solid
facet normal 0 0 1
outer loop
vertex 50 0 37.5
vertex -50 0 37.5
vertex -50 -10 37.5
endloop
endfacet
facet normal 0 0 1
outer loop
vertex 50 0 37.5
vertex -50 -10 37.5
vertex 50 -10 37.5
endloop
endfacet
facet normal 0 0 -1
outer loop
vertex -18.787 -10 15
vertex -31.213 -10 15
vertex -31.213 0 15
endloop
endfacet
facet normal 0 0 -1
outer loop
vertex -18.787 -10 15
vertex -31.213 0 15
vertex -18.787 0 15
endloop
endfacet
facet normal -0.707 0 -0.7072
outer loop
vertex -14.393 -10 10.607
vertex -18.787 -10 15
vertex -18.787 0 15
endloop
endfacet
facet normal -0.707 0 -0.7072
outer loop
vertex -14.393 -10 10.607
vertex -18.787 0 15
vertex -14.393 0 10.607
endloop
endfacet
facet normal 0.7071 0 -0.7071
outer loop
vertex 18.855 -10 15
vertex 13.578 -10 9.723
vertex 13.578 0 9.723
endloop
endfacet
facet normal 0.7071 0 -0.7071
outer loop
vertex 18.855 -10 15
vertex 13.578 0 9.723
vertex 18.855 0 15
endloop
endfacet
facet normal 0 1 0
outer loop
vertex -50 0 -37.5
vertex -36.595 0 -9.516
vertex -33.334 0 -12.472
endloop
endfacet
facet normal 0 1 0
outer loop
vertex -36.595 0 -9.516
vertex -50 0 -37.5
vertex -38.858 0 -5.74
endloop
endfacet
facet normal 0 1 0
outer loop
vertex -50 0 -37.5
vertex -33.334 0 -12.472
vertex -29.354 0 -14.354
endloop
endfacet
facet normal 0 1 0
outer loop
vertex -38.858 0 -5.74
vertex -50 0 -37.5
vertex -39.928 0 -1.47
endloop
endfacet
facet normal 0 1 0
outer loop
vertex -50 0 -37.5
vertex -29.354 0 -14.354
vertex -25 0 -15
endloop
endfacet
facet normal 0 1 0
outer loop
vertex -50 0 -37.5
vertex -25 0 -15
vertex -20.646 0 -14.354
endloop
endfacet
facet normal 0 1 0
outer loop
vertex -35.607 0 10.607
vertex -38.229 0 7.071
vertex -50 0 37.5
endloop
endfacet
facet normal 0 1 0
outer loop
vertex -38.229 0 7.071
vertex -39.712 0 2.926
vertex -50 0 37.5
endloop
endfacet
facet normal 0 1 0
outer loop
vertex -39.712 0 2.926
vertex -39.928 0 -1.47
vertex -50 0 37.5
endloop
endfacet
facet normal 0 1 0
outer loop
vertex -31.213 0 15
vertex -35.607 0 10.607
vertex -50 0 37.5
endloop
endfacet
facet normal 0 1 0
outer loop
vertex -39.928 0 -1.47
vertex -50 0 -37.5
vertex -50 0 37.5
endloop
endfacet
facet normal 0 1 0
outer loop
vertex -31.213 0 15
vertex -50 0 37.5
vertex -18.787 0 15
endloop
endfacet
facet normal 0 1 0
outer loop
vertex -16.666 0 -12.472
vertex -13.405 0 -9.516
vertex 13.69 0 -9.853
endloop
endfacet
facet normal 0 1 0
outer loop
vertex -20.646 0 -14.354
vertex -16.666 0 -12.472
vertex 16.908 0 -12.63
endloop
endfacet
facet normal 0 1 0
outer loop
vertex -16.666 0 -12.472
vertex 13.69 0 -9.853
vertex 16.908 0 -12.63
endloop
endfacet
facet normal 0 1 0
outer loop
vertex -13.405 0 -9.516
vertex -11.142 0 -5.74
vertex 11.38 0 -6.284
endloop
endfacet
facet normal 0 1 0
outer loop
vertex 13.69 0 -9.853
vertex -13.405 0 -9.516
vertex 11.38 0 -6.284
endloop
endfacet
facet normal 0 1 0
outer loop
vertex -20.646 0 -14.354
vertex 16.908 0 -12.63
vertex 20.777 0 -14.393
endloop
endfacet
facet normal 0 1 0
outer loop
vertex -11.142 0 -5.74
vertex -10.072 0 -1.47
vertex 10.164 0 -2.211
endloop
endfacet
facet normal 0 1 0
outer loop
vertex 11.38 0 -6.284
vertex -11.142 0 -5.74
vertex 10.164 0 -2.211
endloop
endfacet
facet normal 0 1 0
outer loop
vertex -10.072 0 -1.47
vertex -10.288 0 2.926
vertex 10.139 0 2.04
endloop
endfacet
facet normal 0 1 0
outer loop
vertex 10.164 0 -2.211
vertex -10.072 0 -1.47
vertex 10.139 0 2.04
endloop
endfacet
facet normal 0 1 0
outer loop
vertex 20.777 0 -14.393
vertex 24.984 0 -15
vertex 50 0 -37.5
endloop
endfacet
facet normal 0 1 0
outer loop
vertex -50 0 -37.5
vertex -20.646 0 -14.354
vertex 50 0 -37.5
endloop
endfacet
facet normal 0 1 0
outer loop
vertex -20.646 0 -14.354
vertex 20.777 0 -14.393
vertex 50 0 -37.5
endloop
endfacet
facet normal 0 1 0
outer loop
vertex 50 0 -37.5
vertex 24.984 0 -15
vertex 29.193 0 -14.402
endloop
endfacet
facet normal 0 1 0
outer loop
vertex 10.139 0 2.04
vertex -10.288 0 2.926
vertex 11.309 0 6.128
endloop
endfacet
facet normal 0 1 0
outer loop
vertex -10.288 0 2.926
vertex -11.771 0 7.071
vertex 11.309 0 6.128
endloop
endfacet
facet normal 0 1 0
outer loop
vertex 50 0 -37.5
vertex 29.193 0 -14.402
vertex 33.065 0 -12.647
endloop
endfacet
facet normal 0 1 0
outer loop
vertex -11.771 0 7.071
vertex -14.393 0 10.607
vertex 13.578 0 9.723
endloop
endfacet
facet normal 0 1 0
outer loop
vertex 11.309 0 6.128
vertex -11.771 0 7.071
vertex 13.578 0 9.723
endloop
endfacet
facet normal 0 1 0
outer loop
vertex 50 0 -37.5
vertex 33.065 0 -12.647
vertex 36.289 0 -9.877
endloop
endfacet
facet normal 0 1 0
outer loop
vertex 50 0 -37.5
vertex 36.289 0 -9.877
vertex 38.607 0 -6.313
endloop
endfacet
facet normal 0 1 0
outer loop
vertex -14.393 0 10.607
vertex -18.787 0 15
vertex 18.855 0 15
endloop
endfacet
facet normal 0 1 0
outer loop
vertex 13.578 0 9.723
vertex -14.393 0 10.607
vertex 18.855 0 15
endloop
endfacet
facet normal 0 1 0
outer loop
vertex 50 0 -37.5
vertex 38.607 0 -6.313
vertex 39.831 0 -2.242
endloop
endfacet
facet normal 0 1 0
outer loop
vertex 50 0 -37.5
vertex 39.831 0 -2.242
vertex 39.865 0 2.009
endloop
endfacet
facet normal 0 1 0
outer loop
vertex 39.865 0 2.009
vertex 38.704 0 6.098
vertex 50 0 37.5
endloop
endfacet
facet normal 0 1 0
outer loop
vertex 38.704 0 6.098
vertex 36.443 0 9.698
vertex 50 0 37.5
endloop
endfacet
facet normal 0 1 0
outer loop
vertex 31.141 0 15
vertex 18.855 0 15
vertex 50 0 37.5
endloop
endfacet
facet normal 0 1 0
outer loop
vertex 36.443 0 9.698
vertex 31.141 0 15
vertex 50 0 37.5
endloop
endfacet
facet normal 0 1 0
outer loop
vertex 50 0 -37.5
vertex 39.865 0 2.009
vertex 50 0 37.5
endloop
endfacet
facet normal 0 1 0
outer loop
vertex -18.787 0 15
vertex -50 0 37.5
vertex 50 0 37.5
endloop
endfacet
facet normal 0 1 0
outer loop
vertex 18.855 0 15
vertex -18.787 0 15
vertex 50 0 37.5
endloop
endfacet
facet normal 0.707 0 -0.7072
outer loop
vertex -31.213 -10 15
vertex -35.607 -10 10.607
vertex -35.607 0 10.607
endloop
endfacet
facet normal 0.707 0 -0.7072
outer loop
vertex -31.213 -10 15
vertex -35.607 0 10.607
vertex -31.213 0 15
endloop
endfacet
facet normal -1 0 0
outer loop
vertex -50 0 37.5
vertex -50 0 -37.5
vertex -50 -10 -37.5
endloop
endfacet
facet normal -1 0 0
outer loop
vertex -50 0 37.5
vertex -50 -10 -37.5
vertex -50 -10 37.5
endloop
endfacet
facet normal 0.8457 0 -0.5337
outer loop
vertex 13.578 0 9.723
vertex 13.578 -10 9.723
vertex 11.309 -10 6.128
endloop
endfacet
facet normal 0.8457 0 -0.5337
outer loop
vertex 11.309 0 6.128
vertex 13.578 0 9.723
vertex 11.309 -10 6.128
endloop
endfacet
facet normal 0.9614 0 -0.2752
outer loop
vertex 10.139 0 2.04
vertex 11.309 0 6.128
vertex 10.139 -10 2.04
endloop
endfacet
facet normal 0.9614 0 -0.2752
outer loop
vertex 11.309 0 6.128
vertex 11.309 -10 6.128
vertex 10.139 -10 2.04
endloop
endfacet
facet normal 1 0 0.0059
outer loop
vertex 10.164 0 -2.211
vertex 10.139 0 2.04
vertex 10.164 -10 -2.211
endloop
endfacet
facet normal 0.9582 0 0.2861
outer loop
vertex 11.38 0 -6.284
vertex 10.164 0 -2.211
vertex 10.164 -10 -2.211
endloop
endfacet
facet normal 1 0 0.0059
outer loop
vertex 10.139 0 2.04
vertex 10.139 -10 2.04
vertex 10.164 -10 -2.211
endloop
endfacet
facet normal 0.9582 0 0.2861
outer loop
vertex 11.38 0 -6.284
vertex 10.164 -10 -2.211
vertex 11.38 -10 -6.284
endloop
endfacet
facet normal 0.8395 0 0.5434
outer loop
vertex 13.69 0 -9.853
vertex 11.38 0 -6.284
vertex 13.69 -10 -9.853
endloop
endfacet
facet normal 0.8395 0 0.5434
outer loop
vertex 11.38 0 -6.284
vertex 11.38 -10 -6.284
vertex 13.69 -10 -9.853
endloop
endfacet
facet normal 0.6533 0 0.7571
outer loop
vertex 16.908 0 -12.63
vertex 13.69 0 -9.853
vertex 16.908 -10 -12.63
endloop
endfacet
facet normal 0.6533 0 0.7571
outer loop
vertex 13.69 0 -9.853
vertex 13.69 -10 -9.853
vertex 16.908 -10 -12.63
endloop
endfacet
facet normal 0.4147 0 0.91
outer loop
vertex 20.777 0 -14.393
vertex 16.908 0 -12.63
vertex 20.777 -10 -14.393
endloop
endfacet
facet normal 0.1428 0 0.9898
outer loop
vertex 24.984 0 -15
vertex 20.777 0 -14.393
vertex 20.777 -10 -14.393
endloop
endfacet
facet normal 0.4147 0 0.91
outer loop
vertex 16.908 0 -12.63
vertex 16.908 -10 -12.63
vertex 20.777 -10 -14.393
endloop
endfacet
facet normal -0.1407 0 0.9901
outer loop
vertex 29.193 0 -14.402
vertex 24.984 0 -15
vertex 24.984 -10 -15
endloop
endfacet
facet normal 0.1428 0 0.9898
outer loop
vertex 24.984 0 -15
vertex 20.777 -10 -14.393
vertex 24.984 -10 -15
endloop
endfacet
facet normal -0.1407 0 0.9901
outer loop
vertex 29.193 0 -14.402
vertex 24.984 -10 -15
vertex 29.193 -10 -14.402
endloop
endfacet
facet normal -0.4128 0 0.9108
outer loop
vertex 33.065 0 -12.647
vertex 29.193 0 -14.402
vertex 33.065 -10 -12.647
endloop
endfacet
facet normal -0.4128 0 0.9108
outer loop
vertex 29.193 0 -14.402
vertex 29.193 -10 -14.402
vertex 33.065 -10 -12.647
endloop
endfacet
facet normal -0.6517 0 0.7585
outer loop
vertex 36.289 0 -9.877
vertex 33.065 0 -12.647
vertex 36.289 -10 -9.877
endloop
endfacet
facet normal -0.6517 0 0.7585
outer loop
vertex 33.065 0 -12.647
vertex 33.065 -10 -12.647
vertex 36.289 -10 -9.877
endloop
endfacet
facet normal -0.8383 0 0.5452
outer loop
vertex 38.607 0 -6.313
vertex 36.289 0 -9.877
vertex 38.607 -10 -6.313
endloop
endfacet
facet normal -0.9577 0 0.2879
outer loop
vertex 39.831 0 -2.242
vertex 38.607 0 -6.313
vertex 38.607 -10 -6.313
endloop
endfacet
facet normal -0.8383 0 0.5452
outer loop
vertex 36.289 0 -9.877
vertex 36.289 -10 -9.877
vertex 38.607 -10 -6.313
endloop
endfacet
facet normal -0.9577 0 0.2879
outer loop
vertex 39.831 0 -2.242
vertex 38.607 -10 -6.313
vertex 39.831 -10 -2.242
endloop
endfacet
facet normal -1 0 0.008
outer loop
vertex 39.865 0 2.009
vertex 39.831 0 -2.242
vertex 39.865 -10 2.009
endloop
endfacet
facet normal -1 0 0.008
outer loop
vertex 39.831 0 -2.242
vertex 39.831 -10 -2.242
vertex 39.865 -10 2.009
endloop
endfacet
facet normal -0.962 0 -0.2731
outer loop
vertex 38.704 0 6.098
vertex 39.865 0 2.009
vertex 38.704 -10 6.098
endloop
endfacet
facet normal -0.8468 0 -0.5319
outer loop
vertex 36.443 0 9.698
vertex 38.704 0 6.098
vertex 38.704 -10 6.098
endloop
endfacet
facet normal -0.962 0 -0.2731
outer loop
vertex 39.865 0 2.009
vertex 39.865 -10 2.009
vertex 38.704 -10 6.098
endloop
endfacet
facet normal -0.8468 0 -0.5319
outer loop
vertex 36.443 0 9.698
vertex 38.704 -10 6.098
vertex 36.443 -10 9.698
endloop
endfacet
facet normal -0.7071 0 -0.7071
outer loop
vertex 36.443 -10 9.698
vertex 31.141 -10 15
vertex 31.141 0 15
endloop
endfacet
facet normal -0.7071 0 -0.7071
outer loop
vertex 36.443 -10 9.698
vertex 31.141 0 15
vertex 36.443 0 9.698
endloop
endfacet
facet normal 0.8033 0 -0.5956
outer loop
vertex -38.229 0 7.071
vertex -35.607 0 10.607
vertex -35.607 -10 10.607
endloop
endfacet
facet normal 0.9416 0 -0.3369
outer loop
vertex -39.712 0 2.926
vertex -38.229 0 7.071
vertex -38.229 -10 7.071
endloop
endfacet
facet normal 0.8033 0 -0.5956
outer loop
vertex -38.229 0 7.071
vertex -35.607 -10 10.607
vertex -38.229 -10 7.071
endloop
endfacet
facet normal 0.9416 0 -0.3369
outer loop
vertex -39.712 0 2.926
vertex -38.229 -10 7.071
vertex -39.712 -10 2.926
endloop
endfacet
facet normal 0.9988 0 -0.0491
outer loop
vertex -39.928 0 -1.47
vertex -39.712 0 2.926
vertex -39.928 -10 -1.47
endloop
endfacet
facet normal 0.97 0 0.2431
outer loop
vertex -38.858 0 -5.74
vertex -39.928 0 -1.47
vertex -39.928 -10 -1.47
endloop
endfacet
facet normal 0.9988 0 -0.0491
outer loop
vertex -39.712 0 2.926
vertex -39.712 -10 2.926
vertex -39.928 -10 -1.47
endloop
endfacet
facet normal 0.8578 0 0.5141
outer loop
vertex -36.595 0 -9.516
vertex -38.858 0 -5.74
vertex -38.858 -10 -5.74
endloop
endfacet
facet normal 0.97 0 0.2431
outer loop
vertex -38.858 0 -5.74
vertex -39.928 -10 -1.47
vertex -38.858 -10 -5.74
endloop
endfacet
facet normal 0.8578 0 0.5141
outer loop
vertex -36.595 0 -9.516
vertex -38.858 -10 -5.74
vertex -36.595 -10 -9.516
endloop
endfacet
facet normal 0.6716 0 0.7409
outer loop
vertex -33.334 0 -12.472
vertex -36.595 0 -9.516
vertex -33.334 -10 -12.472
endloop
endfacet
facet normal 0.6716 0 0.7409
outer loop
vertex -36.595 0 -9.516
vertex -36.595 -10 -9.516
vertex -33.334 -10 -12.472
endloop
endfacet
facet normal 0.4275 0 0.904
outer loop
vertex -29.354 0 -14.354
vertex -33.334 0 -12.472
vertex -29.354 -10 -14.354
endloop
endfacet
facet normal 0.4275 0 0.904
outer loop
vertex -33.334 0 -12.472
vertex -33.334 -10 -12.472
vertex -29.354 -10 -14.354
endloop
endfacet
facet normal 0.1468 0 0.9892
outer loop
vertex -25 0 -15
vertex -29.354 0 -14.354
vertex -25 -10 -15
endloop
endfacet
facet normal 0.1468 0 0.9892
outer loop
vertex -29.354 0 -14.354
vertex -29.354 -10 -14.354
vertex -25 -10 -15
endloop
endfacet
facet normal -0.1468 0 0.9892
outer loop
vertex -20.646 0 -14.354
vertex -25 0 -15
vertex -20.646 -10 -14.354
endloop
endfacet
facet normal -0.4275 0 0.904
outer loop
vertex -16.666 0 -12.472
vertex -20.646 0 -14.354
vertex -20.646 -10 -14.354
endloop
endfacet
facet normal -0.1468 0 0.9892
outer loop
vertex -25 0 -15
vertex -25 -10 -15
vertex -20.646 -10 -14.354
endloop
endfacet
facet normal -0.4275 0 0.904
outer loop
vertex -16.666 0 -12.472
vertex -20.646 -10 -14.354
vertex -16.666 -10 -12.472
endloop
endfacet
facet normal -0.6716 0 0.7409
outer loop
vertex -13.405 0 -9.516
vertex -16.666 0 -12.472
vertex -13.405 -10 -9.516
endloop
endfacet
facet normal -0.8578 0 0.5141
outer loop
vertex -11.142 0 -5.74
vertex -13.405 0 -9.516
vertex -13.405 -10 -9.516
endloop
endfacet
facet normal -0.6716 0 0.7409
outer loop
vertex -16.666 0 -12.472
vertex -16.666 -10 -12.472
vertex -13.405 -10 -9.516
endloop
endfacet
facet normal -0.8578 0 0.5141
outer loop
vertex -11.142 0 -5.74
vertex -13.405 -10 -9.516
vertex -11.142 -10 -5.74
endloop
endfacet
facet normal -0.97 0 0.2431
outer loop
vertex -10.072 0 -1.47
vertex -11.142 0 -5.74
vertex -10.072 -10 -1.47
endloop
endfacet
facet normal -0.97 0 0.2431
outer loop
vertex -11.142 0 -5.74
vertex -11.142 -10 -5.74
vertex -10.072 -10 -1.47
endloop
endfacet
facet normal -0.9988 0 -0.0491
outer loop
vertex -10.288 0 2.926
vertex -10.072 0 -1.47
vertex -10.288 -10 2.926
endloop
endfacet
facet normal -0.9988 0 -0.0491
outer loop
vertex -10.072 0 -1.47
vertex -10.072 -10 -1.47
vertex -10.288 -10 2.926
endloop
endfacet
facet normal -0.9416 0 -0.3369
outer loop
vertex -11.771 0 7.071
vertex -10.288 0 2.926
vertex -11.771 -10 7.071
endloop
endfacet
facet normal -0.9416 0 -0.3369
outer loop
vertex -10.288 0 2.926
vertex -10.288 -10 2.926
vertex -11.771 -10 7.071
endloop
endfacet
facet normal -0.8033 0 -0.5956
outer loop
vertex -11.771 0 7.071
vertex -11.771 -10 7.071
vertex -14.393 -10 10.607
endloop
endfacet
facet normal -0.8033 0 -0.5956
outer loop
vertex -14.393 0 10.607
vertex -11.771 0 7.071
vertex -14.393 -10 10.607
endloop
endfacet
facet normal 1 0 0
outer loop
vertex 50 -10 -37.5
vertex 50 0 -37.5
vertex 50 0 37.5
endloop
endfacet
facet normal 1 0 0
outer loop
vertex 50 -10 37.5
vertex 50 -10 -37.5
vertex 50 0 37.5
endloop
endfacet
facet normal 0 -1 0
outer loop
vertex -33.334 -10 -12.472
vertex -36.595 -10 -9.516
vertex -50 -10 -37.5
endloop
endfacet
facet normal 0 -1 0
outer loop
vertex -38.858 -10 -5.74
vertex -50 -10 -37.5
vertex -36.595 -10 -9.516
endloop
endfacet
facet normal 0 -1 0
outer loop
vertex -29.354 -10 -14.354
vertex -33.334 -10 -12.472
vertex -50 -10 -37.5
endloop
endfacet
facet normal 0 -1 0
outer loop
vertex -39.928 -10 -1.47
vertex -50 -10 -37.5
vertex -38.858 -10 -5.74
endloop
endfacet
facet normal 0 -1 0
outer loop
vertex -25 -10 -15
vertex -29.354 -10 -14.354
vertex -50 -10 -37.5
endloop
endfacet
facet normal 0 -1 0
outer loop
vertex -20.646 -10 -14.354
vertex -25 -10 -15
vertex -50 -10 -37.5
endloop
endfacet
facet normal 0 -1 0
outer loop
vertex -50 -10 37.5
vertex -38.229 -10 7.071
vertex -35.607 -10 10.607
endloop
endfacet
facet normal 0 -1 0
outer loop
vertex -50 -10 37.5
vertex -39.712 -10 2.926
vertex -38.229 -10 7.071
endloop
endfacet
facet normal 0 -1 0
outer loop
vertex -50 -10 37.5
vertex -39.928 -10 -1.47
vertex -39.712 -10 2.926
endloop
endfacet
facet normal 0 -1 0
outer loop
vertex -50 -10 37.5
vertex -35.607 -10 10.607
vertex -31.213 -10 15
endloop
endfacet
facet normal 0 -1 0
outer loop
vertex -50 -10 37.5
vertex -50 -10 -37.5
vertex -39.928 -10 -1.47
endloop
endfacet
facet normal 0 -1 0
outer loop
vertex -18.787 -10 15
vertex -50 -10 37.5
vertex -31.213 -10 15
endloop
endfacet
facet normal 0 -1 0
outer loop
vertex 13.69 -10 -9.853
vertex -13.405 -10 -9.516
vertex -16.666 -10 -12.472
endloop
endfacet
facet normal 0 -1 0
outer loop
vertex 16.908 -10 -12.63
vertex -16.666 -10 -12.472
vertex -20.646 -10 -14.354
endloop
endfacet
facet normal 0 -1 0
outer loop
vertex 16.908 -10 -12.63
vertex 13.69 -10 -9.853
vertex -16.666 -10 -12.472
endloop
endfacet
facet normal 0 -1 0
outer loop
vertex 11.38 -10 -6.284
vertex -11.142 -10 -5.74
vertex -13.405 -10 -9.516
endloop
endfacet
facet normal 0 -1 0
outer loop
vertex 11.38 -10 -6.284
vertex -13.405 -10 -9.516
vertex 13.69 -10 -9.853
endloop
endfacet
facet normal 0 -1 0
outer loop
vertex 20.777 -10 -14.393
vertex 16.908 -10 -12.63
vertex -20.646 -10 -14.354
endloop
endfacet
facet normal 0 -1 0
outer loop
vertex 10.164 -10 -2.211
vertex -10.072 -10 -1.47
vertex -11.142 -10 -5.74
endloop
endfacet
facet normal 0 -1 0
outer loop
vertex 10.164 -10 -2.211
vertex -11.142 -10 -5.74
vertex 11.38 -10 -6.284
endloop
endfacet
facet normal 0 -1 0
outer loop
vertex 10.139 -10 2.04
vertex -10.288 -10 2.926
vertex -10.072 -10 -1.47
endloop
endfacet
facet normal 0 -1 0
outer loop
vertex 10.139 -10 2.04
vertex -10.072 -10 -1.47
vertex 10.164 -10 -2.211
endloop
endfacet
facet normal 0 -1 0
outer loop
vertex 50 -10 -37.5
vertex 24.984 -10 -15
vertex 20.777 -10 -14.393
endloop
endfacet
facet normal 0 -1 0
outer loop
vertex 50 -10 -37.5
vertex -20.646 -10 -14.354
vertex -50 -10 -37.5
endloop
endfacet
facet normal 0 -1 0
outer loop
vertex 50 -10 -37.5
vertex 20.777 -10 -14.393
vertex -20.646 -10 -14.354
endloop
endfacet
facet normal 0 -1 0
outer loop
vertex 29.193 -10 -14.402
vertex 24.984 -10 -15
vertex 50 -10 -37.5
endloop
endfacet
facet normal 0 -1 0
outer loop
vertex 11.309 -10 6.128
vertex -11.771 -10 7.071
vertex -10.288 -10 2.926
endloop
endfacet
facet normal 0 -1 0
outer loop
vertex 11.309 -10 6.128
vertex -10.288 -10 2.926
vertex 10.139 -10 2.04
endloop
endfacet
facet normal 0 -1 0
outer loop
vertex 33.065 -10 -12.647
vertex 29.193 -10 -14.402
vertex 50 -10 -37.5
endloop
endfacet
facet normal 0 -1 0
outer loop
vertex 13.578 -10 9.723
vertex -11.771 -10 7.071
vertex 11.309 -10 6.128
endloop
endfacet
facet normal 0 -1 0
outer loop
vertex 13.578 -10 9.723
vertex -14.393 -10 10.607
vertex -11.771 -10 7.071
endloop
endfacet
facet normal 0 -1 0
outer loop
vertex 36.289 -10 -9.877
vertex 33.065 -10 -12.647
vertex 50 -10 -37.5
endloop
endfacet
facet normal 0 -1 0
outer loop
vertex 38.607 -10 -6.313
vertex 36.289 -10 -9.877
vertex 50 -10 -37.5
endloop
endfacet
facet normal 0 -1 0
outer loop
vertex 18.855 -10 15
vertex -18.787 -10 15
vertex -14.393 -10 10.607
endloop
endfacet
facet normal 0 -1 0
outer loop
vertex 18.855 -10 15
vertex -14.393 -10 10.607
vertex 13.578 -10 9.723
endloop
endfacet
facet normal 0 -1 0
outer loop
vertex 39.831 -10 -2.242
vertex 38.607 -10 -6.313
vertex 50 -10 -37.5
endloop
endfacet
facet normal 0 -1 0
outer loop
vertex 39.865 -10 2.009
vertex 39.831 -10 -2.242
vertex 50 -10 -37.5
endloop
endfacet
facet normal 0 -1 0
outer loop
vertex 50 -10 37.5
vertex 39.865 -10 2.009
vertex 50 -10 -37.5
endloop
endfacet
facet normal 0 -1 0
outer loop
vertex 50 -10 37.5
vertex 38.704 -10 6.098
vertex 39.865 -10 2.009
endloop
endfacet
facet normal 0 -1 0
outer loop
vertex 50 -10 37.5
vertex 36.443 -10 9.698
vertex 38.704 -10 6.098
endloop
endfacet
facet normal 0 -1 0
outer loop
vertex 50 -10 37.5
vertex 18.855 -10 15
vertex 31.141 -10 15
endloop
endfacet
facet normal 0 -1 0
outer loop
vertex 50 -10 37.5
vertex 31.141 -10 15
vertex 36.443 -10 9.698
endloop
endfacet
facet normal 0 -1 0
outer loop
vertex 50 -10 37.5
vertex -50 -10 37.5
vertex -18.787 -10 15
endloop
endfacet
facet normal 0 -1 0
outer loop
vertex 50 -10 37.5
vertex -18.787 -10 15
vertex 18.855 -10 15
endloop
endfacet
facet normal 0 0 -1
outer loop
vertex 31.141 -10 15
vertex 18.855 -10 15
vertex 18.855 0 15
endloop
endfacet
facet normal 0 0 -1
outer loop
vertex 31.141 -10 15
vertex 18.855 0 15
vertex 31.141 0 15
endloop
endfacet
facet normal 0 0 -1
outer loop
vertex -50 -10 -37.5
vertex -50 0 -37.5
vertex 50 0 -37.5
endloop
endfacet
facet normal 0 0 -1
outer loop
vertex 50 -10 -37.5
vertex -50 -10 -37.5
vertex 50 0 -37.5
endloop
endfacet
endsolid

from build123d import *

# Parameters (mm, degrees)
SKETCH_W     = 100
SKETCH_H     = 75
PAD_DEPTH    = 10
POCKET_DEPTH = 10.001


with BuildPart() as part:
    # Sketch → Pad (new body)
    with BuildSketch(Plane.XZ):
        Rectangle(SKETCH_W, SKETCH_H)
    extrude(amount=PAD_DEPTH)

    # Sketch001 → Pocket (cut, through all)
    with BuildSketch(Plane.XZ.offset(10)):
        with BuildLine():
            ThreePointArc((-35.606608, 10.606596), (-25.000001, -15), (-14.393391, 10.606594))
            Line((-18.786797, 15), (-14.393391, 10.606594))
            Line((-31.213203, 15), (-18.786797, 15))
            Line((-35.606608, 10.606596), (-31.213203, 15))
        make_face()
        with BuildLine():
            ThreePointArc((13.577536, 9.722516), (24.984095, -14.999992), (36.443057, 9.69827))
            Line((31.141327, 15), (36.443057, 9.69827))
            Line((18.85502, 15), (31.141327, 15))
            Line((13.577536, 9.722516), (18.85502, 15))
        make_face()
    extrude(amount=-POCKET_DEPTH, mode=Mode.SUBTRACT)


solid = part.part
